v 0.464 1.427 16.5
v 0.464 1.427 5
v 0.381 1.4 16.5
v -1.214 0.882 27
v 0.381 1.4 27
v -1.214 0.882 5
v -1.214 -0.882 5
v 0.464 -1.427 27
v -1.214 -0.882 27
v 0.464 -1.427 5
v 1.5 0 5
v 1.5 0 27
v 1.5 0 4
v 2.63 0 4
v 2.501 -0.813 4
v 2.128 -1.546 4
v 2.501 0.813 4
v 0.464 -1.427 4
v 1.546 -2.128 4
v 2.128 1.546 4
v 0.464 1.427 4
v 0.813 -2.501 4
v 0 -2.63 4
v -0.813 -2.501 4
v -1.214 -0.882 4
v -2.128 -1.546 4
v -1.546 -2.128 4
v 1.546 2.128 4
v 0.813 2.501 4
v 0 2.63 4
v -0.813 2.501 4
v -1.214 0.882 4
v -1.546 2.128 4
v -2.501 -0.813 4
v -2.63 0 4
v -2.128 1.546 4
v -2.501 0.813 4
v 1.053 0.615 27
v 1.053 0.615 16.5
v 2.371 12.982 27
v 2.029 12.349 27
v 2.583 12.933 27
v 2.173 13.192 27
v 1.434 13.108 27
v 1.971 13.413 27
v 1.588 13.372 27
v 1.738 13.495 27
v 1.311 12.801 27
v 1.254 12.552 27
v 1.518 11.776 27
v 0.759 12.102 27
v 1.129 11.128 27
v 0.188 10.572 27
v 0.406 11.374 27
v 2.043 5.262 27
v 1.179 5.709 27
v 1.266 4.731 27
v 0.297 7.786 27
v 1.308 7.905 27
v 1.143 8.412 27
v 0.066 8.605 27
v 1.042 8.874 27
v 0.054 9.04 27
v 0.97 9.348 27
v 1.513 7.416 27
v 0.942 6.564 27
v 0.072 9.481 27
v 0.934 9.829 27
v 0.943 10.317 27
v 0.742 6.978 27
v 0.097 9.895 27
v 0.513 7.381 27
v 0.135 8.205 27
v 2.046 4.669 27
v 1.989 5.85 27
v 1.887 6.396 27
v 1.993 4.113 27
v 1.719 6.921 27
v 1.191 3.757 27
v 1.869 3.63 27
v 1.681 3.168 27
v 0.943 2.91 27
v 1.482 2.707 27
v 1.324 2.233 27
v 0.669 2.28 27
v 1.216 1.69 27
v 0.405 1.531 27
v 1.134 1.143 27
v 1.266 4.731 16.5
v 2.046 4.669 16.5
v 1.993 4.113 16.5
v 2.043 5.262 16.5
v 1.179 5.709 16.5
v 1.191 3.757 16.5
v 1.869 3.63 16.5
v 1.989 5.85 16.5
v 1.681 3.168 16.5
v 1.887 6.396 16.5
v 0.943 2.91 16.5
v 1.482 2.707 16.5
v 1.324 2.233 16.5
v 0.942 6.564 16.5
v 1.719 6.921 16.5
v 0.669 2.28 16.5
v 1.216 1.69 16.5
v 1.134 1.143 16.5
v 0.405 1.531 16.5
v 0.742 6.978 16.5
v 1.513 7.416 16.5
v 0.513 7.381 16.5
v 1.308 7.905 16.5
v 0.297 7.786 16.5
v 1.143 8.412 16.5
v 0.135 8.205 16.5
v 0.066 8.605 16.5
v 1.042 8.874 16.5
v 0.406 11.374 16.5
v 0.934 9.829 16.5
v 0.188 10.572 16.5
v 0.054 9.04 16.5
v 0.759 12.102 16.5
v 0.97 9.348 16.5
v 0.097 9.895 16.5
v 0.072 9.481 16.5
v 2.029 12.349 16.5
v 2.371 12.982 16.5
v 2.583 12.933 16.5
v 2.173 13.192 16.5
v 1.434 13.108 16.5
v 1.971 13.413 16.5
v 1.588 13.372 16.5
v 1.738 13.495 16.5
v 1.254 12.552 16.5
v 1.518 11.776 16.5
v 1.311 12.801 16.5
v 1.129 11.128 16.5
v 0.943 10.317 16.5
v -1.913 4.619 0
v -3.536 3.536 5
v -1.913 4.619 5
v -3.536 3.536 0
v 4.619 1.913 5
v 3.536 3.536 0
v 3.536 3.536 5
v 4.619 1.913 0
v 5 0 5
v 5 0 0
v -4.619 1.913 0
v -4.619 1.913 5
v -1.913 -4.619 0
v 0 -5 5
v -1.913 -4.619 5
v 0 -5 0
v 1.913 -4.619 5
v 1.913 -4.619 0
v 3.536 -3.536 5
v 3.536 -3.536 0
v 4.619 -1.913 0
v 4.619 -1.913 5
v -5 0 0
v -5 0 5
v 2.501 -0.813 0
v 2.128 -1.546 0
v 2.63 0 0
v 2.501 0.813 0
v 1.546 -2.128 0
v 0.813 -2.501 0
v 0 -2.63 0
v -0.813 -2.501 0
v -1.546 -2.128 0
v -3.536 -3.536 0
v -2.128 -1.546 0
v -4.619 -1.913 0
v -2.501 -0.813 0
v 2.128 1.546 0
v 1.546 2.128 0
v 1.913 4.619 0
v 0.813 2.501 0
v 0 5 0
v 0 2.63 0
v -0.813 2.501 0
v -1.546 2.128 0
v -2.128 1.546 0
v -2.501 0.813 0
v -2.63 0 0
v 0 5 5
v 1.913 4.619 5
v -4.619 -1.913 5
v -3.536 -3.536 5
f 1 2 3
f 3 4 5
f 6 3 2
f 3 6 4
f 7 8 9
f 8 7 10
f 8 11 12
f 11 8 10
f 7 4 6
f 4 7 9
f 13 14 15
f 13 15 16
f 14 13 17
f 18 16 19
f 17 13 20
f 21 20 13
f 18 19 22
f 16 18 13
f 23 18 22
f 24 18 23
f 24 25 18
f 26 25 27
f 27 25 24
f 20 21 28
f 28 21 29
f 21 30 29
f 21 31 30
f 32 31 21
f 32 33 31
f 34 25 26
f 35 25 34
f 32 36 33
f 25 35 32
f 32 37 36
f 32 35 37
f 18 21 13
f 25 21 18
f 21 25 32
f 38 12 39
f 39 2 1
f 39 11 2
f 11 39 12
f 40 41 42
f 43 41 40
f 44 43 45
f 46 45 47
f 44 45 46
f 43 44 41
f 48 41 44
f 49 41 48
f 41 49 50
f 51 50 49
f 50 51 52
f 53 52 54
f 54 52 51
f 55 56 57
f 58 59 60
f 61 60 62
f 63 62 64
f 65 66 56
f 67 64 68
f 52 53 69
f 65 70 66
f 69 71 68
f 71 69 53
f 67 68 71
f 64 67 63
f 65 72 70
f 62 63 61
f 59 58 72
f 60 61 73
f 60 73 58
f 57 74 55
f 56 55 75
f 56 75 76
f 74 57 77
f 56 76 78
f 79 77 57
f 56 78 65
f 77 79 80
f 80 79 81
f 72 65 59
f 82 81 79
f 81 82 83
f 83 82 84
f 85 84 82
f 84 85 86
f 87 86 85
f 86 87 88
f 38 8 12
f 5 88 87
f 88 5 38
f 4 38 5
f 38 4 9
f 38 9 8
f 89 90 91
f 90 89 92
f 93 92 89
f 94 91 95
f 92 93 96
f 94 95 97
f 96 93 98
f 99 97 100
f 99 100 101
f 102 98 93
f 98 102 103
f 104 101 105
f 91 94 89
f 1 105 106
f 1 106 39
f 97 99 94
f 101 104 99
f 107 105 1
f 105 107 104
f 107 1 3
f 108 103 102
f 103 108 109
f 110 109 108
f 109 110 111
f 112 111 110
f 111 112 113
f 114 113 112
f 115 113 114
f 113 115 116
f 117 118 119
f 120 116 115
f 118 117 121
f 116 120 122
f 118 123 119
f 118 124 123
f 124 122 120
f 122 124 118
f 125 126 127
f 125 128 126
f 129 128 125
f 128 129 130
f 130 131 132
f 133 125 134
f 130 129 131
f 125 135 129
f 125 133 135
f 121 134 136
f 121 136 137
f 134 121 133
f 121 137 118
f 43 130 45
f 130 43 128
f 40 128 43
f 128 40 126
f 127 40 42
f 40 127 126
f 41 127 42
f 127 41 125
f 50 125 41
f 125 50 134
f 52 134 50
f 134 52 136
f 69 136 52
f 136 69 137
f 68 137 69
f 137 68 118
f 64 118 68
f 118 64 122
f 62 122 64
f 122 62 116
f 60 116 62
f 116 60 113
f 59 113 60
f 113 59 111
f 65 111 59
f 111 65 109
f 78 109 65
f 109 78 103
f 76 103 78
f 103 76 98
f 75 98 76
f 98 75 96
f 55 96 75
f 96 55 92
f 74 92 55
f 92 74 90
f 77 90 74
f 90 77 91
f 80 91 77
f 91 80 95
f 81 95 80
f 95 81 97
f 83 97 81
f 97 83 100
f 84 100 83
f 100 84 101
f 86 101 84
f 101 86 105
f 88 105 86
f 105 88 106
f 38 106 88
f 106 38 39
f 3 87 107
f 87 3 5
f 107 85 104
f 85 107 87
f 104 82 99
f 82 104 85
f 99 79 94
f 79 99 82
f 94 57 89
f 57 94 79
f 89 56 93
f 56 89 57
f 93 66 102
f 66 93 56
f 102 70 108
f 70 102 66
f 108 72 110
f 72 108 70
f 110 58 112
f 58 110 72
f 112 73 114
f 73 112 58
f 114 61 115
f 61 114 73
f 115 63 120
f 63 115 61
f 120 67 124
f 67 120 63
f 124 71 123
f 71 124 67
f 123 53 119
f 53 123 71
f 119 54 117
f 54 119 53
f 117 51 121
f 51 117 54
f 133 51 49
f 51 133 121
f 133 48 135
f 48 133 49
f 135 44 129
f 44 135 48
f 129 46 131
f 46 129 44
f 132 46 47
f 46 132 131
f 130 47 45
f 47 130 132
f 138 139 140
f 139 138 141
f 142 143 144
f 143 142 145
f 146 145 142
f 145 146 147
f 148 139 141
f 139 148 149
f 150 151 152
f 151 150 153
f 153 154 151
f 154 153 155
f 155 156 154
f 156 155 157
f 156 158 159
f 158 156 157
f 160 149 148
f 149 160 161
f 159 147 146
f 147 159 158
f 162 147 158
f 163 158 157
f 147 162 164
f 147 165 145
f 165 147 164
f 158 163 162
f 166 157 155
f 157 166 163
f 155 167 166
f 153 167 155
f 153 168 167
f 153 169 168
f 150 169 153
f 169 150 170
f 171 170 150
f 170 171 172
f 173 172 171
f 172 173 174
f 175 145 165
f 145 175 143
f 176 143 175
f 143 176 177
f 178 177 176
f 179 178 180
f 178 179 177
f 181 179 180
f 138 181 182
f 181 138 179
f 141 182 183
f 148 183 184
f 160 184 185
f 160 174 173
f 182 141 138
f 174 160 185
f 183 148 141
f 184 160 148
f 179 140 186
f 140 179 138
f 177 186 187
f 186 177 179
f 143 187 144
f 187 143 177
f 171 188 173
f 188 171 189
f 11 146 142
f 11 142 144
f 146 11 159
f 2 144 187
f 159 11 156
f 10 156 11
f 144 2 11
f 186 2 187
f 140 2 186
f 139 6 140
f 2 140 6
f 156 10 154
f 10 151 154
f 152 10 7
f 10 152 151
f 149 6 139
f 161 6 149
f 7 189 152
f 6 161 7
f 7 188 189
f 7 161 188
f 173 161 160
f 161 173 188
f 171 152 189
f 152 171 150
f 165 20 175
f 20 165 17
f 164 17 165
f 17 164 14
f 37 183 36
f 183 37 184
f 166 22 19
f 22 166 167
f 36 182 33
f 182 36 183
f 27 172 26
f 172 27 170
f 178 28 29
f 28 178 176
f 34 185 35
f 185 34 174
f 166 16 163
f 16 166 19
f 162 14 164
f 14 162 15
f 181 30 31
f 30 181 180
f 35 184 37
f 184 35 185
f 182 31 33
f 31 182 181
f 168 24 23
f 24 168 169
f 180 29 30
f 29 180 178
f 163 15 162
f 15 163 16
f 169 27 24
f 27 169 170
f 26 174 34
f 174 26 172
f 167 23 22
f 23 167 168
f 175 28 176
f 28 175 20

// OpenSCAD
module flag(){

cylinder(23,1.5,1.5);

scale(.15,.15,.15)
linear_extrude(height = 70, center = false) {
polygon(points=[[2.76,0],[3.57,-0.23],[4.44,-0.38],[5.34,-0.44],[6.23,-0.41],[7,-3.98],[7.56,-7.62],[8.11,-11.27],[8.83,-14.89],[9.88,-18.05],[11.21,-21.12],[12.46,-24.2],[13.29,-27.42],[13.64,-31.13],[13.62,-35.08],[13.26,-39],[12.58,-42.64],[11.46,-46.14],[10.09,-49.44],[8.72,-52.7],[7.62,-56.08],[6.95,-59.16],[6.47,-62.32],[6.23,-65.53],[6.29,-68.78],[7.53,-74.19],[10.12,-78.51],[13.53,-82.33],[17.22,-86.22],[15.81,-86.55],[14.49,-87.95],[13.14,-89.42],[11.59,-89.97],[10.59,-89.15],[9.56,-87.39],[8.74,-85.34],[8.36,-83.68],[5.06,-80.68],[2.71,-75.83],[1.25,-70.48],[0.65,-65.97],[0.48,-63.21],[0.36,-60.27],[0.44,-57.37],[0.9,-54.7],[1.98,-51.91],[3.42,-49.21],[4.95,-46.52],[6.28,-43.76],[7.86,-38.06],[8.44,-31.54],[7.94,-25.05],[6.29,-19.4],[4.46,-15.2],[2.7,-10.21],[1.77,-5.14],[2.41,-0.71]]);

}}


rotate([180,0,0])
translate([0,0,-27])
flag();

difference(){
cylinder(h=5,r=5);
translate([0,0,-6
])
cylinder(h=10,r=2.63,$fn=20);

}
